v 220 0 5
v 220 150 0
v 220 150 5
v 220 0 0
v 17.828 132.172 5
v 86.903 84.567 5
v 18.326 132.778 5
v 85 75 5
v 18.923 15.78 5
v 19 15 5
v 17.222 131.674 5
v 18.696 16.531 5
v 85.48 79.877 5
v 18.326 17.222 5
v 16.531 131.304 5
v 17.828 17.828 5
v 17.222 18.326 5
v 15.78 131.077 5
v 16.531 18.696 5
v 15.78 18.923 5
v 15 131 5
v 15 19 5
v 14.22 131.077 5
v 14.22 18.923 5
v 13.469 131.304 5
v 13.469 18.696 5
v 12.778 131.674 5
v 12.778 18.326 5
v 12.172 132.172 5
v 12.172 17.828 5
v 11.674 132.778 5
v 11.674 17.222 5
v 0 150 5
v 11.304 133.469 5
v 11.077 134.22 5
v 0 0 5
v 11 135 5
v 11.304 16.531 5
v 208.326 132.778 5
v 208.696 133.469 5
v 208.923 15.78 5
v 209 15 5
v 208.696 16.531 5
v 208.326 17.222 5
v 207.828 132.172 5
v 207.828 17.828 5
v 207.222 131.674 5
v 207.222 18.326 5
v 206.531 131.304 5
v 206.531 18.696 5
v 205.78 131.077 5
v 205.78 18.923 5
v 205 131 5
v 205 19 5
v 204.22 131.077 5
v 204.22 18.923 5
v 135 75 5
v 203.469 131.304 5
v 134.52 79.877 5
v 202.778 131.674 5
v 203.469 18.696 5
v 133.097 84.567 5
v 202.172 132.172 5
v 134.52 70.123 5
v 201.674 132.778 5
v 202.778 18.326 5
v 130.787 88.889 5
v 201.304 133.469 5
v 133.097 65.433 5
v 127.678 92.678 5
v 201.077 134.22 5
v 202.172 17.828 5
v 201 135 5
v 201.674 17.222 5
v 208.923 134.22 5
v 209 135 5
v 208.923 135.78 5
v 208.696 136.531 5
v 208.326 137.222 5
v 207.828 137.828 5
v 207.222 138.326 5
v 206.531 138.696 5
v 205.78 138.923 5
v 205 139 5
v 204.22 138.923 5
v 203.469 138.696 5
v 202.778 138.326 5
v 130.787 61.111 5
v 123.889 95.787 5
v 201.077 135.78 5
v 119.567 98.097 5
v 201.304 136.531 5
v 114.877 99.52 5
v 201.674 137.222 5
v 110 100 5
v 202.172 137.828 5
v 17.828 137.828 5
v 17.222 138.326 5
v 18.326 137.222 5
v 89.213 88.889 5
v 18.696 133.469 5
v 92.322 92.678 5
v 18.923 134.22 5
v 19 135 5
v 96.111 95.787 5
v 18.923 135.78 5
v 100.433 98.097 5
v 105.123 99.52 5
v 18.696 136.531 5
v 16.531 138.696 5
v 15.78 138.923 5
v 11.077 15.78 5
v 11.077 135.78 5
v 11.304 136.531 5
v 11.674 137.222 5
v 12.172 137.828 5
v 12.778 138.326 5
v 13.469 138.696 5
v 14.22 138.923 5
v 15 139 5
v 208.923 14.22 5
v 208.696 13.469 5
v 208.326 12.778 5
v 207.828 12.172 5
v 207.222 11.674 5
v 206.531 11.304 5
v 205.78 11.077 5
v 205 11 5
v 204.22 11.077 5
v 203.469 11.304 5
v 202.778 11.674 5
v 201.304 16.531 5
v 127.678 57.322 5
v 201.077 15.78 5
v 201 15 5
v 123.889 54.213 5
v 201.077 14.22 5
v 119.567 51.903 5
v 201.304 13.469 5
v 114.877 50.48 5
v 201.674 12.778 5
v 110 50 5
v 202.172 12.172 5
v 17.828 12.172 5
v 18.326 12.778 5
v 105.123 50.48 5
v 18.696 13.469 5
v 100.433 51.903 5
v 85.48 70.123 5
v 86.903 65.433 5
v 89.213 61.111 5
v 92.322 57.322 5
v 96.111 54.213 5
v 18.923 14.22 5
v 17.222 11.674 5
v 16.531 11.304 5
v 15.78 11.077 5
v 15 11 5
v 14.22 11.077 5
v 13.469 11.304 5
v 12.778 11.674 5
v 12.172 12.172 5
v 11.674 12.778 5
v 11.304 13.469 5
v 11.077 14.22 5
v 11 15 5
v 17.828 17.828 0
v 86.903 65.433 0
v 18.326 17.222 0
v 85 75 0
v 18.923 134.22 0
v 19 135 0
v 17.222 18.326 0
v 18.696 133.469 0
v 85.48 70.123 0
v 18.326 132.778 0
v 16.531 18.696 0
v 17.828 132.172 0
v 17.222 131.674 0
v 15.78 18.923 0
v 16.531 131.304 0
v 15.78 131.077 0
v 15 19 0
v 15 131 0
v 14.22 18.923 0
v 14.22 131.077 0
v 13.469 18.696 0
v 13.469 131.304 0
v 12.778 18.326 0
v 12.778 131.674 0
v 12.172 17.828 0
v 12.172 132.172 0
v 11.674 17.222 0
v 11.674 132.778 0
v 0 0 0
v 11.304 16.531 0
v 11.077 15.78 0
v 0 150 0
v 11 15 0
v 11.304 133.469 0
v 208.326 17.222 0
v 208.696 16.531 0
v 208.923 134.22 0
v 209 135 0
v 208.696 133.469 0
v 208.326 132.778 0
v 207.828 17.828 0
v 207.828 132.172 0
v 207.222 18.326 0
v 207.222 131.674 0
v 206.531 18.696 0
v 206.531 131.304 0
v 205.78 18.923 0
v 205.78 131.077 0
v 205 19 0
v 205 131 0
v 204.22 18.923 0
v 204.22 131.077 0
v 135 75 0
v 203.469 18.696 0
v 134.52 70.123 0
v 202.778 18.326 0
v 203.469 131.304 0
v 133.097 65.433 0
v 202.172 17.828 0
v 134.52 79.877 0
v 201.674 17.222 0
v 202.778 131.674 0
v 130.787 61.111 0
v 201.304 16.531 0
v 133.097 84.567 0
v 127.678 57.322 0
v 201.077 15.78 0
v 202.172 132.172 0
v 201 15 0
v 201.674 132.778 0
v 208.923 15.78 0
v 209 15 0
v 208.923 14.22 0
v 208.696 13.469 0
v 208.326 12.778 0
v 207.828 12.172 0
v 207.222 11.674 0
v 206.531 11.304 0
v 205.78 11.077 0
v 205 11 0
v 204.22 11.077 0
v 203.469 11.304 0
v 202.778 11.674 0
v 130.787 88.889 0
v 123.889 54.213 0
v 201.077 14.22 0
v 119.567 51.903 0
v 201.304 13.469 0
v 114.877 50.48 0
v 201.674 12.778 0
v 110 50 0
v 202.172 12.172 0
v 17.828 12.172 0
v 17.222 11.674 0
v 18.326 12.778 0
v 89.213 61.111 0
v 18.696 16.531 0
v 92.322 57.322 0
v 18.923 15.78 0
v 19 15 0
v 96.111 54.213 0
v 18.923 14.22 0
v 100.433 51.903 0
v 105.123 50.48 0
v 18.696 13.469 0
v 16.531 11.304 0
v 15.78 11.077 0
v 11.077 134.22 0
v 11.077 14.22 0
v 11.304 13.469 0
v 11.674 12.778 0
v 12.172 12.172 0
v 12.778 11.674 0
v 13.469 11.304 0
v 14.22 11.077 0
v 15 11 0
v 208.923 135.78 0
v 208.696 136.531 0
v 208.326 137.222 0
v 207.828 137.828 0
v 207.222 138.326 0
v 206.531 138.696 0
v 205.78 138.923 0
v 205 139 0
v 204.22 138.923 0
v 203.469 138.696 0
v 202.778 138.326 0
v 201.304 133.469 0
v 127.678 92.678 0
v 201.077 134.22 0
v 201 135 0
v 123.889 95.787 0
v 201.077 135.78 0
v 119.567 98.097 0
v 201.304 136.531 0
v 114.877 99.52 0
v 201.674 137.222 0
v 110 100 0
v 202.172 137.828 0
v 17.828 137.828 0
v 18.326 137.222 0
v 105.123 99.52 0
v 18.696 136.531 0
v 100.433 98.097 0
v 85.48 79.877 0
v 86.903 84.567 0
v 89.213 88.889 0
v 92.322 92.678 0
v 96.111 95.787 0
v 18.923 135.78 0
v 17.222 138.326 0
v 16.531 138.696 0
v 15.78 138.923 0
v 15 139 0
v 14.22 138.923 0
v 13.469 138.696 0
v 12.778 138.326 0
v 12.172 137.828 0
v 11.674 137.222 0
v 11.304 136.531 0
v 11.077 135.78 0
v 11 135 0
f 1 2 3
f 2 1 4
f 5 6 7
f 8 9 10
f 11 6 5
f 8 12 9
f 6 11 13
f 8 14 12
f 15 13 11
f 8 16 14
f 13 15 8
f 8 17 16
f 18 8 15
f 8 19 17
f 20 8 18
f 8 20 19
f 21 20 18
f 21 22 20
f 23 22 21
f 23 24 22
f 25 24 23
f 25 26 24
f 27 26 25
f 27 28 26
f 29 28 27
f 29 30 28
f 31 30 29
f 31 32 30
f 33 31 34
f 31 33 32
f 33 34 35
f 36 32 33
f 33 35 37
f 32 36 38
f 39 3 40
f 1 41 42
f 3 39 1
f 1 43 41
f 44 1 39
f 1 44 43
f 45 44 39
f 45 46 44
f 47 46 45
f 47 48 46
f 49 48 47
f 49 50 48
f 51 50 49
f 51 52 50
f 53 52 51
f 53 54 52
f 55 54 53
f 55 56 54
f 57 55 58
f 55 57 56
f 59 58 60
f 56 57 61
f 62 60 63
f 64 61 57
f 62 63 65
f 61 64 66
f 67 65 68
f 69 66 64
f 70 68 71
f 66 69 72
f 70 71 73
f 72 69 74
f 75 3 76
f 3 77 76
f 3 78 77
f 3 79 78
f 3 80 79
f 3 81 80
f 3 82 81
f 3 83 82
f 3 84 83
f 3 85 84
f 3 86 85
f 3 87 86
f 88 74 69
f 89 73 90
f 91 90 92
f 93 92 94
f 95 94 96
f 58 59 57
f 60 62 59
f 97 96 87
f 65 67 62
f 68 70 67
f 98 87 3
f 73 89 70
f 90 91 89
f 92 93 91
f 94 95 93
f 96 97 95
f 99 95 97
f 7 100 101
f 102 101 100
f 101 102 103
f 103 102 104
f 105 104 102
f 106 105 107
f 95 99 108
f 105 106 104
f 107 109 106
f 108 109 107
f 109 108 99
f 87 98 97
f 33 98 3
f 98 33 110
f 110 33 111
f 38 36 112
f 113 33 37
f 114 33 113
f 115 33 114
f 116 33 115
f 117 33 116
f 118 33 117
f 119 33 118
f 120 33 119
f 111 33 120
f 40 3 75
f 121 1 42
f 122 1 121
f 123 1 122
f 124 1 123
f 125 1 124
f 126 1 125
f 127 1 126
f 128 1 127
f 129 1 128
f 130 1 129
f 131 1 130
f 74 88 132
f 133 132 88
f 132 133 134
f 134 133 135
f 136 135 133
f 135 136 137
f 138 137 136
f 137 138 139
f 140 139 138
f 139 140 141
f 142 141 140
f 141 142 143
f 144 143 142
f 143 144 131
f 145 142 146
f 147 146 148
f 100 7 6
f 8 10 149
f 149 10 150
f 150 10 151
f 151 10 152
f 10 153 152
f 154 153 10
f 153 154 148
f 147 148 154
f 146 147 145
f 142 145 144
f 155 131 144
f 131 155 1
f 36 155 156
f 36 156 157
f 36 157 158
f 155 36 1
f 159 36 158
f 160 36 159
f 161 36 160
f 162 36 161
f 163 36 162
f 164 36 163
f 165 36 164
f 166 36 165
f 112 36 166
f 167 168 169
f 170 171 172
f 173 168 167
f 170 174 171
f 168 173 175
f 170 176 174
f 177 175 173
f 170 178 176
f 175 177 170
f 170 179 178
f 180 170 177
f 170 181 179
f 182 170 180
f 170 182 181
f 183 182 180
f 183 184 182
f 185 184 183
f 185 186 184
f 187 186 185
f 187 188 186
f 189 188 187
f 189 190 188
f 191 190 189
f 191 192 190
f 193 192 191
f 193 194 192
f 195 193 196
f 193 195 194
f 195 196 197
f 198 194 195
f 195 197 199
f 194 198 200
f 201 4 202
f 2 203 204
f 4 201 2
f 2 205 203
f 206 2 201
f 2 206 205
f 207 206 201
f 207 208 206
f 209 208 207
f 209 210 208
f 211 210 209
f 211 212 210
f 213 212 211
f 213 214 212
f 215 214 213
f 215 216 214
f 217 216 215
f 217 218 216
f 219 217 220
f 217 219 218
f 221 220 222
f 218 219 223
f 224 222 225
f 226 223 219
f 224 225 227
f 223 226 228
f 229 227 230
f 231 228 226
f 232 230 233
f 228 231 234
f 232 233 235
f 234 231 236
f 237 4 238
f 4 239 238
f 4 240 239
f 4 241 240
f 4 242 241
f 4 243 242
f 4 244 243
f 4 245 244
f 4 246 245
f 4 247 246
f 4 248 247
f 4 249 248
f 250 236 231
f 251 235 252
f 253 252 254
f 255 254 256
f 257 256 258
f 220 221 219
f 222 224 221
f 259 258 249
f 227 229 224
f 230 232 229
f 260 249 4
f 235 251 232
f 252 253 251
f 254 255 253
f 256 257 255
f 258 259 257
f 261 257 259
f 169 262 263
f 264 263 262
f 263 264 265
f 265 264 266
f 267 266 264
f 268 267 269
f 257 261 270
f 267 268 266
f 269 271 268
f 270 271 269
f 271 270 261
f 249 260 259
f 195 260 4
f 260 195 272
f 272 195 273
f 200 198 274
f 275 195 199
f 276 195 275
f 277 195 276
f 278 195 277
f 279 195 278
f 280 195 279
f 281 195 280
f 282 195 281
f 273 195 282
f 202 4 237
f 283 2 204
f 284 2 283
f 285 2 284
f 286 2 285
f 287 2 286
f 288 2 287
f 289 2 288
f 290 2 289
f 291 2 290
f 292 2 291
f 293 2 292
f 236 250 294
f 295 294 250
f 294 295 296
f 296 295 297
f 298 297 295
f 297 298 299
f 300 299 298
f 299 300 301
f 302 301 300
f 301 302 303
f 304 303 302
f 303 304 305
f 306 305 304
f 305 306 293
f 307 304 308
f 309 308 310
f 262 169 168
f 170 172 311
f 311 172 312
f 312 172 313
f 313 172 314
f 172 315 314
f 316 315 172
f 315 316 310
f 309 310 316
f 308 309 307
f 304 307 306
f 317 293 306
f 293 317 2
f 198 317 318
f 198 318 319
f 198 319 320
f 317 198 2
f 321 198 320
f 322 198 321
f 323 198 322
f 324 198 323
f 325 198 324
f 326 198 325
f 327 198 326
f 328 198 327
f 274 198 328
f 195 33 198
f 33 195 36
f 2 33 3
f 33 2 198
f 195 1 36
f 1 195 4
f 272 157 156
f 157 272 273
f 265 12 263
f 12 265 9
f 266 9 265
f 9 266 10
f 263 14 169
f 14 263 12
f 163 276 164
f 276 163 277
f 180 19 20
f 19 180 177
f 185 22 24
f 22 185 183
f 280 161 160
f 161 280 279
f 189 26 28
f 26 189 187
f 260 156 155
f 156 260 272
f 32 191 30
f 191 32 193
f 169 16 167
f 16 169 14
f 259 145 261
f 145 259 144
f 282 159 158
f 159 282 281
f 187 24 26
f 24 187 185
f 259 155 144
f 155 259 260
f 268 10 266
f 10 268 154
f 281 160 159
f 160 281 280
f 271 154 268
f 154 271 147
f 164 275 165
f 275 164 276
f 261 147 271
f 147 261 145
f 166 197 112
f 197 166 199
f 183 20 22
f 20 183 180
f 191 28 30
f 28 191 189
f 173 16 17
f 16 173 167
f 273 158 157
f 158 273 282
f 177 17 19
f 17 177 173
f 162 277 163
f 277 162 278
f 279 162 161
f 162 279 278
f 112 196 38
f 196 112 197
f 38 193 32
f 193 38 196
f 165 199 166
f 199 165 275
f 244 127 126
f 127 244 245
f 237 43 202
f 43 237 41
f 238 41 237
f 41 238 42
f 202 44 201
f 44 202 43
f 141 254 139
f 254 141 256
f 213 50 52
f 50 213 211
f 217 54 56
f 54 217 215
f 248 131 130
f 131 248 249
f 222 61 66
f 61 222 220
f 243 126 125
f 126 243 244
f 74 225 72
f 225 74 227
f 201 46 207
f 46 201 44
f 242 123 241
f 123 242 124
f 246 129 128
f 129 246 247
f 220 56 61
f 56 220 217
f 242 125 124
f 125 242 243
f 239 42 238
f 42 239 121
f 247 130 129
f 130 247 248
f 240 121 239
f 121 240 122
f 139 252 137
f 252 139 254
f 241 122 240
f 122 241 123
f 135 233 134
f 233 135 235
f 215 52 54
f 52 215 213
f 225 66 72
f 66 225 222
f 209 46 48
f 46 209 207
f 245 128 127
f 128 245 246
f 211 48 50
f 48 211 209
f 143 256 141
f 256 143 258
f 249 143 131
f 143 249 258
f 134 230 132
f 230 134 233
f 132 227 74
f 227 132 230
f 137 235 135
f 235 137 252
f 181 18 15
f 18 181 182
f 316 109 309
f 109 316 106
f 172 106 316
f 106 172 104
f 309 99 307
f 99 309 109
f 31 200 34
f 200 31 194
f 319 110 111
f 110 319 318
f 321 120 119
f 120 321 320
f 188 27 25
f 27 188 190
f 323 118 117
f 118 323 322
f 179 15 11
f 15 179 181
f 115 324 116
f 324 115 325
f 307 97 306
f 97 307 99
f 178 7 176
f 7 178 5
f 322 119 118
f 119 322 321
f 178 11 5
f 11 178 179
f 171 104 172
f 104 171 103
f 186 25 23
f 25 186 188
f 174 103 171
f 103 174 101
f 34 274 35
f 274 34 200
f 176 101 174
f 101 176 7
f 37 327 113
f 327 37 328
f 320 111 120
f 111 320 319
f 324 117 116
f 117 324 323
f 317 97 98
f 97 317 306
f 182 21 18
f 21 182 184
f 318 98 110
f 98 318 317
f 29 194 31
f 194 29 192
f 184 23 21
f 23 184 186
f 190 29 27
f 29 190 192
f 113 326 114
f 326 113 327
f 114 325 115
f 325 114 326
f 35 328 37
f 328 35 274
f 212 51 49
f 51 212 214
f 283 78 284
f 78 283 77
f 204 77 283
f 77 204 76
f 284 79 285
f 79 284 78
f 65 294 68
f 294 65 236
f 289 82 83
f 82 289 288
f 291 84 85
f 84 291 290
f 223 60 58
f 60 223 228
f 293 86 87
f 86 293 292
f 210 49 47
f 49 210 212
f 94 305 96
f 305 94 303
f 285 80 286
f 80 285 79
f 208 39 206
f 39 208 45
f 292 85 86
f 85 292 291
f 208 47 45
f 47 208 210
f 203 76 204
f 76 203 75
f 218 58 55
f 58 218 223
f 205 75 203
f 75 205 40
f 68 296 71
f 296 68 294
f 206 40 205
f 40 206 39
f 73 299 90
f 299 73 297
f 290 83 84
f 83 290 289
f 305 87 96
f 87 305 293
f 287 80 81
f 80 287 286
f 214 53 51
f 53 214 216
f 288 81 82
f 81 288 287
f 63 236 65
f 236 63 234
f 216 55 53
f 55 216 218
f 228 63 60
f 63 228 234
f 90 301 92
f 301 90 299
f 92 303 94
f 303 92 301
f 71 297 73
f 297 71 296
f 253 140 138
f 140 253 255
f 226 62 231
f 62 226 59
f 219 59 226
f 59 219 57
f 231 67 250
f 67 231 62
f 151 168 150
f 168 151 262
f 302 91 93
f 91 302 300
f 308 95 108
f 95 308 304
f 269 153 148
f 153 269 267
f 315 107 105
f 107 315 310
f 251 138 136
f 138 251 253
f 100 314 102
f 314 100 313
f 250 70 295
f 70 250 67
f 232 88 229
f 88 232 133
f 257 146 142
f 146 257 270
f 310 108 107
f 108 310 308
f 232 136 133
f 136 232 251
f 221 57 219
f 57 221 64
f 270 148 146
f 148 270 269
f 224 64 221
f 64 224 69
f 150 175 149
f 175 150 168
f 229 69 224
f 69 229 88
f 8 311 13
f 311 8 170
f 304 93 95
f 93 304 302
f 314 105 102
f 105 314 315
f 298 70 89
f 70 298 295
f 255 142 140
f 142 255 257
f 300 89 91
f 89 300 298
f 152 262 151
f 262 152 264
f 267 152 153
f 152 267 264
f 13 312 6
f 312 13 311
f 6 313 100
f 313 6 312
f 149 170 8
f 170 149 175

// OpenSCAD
$fn = 32;

// ----------------------------------------------------------------------
// Big plate: 200-250 mm adapter plate
// ----------------------------------------------------------------------

// --- parameters (mm) ---
plate_l = 220;            // plate length, X
plate_w = 150;            // plate width, Y
plate_t = 5;              // plate thickness, Z
corner_d = 8;             // corner hole diameter
corner_in = 15;           // corner hole inset from the edges
bore_d = 50;              // central bore

difference() {
  cube([plate_l, plate_w, plate_t]);
  translate([corner_in, corner_in, -1]) cylinder(h = plate_t + 2, d = corner_d);
  translate([plate_l - corner_in, corner_in, -1]) cylinder(h = plate_t + 2, d = corner_d);
  translate([corner_in, plate_w - corner_in, -1]) cylinder(h = plate_t + 2, d = corner_d);
  translate([plate_l - corner_in, plate_w - corner_in, -1]) cylinder(h = plate_t + 2, d = corner_d);
  translate([plate_l / 2, plate_w / 2, -1]) cylinder(h = plate_t + 2, d = bore_d);
}
